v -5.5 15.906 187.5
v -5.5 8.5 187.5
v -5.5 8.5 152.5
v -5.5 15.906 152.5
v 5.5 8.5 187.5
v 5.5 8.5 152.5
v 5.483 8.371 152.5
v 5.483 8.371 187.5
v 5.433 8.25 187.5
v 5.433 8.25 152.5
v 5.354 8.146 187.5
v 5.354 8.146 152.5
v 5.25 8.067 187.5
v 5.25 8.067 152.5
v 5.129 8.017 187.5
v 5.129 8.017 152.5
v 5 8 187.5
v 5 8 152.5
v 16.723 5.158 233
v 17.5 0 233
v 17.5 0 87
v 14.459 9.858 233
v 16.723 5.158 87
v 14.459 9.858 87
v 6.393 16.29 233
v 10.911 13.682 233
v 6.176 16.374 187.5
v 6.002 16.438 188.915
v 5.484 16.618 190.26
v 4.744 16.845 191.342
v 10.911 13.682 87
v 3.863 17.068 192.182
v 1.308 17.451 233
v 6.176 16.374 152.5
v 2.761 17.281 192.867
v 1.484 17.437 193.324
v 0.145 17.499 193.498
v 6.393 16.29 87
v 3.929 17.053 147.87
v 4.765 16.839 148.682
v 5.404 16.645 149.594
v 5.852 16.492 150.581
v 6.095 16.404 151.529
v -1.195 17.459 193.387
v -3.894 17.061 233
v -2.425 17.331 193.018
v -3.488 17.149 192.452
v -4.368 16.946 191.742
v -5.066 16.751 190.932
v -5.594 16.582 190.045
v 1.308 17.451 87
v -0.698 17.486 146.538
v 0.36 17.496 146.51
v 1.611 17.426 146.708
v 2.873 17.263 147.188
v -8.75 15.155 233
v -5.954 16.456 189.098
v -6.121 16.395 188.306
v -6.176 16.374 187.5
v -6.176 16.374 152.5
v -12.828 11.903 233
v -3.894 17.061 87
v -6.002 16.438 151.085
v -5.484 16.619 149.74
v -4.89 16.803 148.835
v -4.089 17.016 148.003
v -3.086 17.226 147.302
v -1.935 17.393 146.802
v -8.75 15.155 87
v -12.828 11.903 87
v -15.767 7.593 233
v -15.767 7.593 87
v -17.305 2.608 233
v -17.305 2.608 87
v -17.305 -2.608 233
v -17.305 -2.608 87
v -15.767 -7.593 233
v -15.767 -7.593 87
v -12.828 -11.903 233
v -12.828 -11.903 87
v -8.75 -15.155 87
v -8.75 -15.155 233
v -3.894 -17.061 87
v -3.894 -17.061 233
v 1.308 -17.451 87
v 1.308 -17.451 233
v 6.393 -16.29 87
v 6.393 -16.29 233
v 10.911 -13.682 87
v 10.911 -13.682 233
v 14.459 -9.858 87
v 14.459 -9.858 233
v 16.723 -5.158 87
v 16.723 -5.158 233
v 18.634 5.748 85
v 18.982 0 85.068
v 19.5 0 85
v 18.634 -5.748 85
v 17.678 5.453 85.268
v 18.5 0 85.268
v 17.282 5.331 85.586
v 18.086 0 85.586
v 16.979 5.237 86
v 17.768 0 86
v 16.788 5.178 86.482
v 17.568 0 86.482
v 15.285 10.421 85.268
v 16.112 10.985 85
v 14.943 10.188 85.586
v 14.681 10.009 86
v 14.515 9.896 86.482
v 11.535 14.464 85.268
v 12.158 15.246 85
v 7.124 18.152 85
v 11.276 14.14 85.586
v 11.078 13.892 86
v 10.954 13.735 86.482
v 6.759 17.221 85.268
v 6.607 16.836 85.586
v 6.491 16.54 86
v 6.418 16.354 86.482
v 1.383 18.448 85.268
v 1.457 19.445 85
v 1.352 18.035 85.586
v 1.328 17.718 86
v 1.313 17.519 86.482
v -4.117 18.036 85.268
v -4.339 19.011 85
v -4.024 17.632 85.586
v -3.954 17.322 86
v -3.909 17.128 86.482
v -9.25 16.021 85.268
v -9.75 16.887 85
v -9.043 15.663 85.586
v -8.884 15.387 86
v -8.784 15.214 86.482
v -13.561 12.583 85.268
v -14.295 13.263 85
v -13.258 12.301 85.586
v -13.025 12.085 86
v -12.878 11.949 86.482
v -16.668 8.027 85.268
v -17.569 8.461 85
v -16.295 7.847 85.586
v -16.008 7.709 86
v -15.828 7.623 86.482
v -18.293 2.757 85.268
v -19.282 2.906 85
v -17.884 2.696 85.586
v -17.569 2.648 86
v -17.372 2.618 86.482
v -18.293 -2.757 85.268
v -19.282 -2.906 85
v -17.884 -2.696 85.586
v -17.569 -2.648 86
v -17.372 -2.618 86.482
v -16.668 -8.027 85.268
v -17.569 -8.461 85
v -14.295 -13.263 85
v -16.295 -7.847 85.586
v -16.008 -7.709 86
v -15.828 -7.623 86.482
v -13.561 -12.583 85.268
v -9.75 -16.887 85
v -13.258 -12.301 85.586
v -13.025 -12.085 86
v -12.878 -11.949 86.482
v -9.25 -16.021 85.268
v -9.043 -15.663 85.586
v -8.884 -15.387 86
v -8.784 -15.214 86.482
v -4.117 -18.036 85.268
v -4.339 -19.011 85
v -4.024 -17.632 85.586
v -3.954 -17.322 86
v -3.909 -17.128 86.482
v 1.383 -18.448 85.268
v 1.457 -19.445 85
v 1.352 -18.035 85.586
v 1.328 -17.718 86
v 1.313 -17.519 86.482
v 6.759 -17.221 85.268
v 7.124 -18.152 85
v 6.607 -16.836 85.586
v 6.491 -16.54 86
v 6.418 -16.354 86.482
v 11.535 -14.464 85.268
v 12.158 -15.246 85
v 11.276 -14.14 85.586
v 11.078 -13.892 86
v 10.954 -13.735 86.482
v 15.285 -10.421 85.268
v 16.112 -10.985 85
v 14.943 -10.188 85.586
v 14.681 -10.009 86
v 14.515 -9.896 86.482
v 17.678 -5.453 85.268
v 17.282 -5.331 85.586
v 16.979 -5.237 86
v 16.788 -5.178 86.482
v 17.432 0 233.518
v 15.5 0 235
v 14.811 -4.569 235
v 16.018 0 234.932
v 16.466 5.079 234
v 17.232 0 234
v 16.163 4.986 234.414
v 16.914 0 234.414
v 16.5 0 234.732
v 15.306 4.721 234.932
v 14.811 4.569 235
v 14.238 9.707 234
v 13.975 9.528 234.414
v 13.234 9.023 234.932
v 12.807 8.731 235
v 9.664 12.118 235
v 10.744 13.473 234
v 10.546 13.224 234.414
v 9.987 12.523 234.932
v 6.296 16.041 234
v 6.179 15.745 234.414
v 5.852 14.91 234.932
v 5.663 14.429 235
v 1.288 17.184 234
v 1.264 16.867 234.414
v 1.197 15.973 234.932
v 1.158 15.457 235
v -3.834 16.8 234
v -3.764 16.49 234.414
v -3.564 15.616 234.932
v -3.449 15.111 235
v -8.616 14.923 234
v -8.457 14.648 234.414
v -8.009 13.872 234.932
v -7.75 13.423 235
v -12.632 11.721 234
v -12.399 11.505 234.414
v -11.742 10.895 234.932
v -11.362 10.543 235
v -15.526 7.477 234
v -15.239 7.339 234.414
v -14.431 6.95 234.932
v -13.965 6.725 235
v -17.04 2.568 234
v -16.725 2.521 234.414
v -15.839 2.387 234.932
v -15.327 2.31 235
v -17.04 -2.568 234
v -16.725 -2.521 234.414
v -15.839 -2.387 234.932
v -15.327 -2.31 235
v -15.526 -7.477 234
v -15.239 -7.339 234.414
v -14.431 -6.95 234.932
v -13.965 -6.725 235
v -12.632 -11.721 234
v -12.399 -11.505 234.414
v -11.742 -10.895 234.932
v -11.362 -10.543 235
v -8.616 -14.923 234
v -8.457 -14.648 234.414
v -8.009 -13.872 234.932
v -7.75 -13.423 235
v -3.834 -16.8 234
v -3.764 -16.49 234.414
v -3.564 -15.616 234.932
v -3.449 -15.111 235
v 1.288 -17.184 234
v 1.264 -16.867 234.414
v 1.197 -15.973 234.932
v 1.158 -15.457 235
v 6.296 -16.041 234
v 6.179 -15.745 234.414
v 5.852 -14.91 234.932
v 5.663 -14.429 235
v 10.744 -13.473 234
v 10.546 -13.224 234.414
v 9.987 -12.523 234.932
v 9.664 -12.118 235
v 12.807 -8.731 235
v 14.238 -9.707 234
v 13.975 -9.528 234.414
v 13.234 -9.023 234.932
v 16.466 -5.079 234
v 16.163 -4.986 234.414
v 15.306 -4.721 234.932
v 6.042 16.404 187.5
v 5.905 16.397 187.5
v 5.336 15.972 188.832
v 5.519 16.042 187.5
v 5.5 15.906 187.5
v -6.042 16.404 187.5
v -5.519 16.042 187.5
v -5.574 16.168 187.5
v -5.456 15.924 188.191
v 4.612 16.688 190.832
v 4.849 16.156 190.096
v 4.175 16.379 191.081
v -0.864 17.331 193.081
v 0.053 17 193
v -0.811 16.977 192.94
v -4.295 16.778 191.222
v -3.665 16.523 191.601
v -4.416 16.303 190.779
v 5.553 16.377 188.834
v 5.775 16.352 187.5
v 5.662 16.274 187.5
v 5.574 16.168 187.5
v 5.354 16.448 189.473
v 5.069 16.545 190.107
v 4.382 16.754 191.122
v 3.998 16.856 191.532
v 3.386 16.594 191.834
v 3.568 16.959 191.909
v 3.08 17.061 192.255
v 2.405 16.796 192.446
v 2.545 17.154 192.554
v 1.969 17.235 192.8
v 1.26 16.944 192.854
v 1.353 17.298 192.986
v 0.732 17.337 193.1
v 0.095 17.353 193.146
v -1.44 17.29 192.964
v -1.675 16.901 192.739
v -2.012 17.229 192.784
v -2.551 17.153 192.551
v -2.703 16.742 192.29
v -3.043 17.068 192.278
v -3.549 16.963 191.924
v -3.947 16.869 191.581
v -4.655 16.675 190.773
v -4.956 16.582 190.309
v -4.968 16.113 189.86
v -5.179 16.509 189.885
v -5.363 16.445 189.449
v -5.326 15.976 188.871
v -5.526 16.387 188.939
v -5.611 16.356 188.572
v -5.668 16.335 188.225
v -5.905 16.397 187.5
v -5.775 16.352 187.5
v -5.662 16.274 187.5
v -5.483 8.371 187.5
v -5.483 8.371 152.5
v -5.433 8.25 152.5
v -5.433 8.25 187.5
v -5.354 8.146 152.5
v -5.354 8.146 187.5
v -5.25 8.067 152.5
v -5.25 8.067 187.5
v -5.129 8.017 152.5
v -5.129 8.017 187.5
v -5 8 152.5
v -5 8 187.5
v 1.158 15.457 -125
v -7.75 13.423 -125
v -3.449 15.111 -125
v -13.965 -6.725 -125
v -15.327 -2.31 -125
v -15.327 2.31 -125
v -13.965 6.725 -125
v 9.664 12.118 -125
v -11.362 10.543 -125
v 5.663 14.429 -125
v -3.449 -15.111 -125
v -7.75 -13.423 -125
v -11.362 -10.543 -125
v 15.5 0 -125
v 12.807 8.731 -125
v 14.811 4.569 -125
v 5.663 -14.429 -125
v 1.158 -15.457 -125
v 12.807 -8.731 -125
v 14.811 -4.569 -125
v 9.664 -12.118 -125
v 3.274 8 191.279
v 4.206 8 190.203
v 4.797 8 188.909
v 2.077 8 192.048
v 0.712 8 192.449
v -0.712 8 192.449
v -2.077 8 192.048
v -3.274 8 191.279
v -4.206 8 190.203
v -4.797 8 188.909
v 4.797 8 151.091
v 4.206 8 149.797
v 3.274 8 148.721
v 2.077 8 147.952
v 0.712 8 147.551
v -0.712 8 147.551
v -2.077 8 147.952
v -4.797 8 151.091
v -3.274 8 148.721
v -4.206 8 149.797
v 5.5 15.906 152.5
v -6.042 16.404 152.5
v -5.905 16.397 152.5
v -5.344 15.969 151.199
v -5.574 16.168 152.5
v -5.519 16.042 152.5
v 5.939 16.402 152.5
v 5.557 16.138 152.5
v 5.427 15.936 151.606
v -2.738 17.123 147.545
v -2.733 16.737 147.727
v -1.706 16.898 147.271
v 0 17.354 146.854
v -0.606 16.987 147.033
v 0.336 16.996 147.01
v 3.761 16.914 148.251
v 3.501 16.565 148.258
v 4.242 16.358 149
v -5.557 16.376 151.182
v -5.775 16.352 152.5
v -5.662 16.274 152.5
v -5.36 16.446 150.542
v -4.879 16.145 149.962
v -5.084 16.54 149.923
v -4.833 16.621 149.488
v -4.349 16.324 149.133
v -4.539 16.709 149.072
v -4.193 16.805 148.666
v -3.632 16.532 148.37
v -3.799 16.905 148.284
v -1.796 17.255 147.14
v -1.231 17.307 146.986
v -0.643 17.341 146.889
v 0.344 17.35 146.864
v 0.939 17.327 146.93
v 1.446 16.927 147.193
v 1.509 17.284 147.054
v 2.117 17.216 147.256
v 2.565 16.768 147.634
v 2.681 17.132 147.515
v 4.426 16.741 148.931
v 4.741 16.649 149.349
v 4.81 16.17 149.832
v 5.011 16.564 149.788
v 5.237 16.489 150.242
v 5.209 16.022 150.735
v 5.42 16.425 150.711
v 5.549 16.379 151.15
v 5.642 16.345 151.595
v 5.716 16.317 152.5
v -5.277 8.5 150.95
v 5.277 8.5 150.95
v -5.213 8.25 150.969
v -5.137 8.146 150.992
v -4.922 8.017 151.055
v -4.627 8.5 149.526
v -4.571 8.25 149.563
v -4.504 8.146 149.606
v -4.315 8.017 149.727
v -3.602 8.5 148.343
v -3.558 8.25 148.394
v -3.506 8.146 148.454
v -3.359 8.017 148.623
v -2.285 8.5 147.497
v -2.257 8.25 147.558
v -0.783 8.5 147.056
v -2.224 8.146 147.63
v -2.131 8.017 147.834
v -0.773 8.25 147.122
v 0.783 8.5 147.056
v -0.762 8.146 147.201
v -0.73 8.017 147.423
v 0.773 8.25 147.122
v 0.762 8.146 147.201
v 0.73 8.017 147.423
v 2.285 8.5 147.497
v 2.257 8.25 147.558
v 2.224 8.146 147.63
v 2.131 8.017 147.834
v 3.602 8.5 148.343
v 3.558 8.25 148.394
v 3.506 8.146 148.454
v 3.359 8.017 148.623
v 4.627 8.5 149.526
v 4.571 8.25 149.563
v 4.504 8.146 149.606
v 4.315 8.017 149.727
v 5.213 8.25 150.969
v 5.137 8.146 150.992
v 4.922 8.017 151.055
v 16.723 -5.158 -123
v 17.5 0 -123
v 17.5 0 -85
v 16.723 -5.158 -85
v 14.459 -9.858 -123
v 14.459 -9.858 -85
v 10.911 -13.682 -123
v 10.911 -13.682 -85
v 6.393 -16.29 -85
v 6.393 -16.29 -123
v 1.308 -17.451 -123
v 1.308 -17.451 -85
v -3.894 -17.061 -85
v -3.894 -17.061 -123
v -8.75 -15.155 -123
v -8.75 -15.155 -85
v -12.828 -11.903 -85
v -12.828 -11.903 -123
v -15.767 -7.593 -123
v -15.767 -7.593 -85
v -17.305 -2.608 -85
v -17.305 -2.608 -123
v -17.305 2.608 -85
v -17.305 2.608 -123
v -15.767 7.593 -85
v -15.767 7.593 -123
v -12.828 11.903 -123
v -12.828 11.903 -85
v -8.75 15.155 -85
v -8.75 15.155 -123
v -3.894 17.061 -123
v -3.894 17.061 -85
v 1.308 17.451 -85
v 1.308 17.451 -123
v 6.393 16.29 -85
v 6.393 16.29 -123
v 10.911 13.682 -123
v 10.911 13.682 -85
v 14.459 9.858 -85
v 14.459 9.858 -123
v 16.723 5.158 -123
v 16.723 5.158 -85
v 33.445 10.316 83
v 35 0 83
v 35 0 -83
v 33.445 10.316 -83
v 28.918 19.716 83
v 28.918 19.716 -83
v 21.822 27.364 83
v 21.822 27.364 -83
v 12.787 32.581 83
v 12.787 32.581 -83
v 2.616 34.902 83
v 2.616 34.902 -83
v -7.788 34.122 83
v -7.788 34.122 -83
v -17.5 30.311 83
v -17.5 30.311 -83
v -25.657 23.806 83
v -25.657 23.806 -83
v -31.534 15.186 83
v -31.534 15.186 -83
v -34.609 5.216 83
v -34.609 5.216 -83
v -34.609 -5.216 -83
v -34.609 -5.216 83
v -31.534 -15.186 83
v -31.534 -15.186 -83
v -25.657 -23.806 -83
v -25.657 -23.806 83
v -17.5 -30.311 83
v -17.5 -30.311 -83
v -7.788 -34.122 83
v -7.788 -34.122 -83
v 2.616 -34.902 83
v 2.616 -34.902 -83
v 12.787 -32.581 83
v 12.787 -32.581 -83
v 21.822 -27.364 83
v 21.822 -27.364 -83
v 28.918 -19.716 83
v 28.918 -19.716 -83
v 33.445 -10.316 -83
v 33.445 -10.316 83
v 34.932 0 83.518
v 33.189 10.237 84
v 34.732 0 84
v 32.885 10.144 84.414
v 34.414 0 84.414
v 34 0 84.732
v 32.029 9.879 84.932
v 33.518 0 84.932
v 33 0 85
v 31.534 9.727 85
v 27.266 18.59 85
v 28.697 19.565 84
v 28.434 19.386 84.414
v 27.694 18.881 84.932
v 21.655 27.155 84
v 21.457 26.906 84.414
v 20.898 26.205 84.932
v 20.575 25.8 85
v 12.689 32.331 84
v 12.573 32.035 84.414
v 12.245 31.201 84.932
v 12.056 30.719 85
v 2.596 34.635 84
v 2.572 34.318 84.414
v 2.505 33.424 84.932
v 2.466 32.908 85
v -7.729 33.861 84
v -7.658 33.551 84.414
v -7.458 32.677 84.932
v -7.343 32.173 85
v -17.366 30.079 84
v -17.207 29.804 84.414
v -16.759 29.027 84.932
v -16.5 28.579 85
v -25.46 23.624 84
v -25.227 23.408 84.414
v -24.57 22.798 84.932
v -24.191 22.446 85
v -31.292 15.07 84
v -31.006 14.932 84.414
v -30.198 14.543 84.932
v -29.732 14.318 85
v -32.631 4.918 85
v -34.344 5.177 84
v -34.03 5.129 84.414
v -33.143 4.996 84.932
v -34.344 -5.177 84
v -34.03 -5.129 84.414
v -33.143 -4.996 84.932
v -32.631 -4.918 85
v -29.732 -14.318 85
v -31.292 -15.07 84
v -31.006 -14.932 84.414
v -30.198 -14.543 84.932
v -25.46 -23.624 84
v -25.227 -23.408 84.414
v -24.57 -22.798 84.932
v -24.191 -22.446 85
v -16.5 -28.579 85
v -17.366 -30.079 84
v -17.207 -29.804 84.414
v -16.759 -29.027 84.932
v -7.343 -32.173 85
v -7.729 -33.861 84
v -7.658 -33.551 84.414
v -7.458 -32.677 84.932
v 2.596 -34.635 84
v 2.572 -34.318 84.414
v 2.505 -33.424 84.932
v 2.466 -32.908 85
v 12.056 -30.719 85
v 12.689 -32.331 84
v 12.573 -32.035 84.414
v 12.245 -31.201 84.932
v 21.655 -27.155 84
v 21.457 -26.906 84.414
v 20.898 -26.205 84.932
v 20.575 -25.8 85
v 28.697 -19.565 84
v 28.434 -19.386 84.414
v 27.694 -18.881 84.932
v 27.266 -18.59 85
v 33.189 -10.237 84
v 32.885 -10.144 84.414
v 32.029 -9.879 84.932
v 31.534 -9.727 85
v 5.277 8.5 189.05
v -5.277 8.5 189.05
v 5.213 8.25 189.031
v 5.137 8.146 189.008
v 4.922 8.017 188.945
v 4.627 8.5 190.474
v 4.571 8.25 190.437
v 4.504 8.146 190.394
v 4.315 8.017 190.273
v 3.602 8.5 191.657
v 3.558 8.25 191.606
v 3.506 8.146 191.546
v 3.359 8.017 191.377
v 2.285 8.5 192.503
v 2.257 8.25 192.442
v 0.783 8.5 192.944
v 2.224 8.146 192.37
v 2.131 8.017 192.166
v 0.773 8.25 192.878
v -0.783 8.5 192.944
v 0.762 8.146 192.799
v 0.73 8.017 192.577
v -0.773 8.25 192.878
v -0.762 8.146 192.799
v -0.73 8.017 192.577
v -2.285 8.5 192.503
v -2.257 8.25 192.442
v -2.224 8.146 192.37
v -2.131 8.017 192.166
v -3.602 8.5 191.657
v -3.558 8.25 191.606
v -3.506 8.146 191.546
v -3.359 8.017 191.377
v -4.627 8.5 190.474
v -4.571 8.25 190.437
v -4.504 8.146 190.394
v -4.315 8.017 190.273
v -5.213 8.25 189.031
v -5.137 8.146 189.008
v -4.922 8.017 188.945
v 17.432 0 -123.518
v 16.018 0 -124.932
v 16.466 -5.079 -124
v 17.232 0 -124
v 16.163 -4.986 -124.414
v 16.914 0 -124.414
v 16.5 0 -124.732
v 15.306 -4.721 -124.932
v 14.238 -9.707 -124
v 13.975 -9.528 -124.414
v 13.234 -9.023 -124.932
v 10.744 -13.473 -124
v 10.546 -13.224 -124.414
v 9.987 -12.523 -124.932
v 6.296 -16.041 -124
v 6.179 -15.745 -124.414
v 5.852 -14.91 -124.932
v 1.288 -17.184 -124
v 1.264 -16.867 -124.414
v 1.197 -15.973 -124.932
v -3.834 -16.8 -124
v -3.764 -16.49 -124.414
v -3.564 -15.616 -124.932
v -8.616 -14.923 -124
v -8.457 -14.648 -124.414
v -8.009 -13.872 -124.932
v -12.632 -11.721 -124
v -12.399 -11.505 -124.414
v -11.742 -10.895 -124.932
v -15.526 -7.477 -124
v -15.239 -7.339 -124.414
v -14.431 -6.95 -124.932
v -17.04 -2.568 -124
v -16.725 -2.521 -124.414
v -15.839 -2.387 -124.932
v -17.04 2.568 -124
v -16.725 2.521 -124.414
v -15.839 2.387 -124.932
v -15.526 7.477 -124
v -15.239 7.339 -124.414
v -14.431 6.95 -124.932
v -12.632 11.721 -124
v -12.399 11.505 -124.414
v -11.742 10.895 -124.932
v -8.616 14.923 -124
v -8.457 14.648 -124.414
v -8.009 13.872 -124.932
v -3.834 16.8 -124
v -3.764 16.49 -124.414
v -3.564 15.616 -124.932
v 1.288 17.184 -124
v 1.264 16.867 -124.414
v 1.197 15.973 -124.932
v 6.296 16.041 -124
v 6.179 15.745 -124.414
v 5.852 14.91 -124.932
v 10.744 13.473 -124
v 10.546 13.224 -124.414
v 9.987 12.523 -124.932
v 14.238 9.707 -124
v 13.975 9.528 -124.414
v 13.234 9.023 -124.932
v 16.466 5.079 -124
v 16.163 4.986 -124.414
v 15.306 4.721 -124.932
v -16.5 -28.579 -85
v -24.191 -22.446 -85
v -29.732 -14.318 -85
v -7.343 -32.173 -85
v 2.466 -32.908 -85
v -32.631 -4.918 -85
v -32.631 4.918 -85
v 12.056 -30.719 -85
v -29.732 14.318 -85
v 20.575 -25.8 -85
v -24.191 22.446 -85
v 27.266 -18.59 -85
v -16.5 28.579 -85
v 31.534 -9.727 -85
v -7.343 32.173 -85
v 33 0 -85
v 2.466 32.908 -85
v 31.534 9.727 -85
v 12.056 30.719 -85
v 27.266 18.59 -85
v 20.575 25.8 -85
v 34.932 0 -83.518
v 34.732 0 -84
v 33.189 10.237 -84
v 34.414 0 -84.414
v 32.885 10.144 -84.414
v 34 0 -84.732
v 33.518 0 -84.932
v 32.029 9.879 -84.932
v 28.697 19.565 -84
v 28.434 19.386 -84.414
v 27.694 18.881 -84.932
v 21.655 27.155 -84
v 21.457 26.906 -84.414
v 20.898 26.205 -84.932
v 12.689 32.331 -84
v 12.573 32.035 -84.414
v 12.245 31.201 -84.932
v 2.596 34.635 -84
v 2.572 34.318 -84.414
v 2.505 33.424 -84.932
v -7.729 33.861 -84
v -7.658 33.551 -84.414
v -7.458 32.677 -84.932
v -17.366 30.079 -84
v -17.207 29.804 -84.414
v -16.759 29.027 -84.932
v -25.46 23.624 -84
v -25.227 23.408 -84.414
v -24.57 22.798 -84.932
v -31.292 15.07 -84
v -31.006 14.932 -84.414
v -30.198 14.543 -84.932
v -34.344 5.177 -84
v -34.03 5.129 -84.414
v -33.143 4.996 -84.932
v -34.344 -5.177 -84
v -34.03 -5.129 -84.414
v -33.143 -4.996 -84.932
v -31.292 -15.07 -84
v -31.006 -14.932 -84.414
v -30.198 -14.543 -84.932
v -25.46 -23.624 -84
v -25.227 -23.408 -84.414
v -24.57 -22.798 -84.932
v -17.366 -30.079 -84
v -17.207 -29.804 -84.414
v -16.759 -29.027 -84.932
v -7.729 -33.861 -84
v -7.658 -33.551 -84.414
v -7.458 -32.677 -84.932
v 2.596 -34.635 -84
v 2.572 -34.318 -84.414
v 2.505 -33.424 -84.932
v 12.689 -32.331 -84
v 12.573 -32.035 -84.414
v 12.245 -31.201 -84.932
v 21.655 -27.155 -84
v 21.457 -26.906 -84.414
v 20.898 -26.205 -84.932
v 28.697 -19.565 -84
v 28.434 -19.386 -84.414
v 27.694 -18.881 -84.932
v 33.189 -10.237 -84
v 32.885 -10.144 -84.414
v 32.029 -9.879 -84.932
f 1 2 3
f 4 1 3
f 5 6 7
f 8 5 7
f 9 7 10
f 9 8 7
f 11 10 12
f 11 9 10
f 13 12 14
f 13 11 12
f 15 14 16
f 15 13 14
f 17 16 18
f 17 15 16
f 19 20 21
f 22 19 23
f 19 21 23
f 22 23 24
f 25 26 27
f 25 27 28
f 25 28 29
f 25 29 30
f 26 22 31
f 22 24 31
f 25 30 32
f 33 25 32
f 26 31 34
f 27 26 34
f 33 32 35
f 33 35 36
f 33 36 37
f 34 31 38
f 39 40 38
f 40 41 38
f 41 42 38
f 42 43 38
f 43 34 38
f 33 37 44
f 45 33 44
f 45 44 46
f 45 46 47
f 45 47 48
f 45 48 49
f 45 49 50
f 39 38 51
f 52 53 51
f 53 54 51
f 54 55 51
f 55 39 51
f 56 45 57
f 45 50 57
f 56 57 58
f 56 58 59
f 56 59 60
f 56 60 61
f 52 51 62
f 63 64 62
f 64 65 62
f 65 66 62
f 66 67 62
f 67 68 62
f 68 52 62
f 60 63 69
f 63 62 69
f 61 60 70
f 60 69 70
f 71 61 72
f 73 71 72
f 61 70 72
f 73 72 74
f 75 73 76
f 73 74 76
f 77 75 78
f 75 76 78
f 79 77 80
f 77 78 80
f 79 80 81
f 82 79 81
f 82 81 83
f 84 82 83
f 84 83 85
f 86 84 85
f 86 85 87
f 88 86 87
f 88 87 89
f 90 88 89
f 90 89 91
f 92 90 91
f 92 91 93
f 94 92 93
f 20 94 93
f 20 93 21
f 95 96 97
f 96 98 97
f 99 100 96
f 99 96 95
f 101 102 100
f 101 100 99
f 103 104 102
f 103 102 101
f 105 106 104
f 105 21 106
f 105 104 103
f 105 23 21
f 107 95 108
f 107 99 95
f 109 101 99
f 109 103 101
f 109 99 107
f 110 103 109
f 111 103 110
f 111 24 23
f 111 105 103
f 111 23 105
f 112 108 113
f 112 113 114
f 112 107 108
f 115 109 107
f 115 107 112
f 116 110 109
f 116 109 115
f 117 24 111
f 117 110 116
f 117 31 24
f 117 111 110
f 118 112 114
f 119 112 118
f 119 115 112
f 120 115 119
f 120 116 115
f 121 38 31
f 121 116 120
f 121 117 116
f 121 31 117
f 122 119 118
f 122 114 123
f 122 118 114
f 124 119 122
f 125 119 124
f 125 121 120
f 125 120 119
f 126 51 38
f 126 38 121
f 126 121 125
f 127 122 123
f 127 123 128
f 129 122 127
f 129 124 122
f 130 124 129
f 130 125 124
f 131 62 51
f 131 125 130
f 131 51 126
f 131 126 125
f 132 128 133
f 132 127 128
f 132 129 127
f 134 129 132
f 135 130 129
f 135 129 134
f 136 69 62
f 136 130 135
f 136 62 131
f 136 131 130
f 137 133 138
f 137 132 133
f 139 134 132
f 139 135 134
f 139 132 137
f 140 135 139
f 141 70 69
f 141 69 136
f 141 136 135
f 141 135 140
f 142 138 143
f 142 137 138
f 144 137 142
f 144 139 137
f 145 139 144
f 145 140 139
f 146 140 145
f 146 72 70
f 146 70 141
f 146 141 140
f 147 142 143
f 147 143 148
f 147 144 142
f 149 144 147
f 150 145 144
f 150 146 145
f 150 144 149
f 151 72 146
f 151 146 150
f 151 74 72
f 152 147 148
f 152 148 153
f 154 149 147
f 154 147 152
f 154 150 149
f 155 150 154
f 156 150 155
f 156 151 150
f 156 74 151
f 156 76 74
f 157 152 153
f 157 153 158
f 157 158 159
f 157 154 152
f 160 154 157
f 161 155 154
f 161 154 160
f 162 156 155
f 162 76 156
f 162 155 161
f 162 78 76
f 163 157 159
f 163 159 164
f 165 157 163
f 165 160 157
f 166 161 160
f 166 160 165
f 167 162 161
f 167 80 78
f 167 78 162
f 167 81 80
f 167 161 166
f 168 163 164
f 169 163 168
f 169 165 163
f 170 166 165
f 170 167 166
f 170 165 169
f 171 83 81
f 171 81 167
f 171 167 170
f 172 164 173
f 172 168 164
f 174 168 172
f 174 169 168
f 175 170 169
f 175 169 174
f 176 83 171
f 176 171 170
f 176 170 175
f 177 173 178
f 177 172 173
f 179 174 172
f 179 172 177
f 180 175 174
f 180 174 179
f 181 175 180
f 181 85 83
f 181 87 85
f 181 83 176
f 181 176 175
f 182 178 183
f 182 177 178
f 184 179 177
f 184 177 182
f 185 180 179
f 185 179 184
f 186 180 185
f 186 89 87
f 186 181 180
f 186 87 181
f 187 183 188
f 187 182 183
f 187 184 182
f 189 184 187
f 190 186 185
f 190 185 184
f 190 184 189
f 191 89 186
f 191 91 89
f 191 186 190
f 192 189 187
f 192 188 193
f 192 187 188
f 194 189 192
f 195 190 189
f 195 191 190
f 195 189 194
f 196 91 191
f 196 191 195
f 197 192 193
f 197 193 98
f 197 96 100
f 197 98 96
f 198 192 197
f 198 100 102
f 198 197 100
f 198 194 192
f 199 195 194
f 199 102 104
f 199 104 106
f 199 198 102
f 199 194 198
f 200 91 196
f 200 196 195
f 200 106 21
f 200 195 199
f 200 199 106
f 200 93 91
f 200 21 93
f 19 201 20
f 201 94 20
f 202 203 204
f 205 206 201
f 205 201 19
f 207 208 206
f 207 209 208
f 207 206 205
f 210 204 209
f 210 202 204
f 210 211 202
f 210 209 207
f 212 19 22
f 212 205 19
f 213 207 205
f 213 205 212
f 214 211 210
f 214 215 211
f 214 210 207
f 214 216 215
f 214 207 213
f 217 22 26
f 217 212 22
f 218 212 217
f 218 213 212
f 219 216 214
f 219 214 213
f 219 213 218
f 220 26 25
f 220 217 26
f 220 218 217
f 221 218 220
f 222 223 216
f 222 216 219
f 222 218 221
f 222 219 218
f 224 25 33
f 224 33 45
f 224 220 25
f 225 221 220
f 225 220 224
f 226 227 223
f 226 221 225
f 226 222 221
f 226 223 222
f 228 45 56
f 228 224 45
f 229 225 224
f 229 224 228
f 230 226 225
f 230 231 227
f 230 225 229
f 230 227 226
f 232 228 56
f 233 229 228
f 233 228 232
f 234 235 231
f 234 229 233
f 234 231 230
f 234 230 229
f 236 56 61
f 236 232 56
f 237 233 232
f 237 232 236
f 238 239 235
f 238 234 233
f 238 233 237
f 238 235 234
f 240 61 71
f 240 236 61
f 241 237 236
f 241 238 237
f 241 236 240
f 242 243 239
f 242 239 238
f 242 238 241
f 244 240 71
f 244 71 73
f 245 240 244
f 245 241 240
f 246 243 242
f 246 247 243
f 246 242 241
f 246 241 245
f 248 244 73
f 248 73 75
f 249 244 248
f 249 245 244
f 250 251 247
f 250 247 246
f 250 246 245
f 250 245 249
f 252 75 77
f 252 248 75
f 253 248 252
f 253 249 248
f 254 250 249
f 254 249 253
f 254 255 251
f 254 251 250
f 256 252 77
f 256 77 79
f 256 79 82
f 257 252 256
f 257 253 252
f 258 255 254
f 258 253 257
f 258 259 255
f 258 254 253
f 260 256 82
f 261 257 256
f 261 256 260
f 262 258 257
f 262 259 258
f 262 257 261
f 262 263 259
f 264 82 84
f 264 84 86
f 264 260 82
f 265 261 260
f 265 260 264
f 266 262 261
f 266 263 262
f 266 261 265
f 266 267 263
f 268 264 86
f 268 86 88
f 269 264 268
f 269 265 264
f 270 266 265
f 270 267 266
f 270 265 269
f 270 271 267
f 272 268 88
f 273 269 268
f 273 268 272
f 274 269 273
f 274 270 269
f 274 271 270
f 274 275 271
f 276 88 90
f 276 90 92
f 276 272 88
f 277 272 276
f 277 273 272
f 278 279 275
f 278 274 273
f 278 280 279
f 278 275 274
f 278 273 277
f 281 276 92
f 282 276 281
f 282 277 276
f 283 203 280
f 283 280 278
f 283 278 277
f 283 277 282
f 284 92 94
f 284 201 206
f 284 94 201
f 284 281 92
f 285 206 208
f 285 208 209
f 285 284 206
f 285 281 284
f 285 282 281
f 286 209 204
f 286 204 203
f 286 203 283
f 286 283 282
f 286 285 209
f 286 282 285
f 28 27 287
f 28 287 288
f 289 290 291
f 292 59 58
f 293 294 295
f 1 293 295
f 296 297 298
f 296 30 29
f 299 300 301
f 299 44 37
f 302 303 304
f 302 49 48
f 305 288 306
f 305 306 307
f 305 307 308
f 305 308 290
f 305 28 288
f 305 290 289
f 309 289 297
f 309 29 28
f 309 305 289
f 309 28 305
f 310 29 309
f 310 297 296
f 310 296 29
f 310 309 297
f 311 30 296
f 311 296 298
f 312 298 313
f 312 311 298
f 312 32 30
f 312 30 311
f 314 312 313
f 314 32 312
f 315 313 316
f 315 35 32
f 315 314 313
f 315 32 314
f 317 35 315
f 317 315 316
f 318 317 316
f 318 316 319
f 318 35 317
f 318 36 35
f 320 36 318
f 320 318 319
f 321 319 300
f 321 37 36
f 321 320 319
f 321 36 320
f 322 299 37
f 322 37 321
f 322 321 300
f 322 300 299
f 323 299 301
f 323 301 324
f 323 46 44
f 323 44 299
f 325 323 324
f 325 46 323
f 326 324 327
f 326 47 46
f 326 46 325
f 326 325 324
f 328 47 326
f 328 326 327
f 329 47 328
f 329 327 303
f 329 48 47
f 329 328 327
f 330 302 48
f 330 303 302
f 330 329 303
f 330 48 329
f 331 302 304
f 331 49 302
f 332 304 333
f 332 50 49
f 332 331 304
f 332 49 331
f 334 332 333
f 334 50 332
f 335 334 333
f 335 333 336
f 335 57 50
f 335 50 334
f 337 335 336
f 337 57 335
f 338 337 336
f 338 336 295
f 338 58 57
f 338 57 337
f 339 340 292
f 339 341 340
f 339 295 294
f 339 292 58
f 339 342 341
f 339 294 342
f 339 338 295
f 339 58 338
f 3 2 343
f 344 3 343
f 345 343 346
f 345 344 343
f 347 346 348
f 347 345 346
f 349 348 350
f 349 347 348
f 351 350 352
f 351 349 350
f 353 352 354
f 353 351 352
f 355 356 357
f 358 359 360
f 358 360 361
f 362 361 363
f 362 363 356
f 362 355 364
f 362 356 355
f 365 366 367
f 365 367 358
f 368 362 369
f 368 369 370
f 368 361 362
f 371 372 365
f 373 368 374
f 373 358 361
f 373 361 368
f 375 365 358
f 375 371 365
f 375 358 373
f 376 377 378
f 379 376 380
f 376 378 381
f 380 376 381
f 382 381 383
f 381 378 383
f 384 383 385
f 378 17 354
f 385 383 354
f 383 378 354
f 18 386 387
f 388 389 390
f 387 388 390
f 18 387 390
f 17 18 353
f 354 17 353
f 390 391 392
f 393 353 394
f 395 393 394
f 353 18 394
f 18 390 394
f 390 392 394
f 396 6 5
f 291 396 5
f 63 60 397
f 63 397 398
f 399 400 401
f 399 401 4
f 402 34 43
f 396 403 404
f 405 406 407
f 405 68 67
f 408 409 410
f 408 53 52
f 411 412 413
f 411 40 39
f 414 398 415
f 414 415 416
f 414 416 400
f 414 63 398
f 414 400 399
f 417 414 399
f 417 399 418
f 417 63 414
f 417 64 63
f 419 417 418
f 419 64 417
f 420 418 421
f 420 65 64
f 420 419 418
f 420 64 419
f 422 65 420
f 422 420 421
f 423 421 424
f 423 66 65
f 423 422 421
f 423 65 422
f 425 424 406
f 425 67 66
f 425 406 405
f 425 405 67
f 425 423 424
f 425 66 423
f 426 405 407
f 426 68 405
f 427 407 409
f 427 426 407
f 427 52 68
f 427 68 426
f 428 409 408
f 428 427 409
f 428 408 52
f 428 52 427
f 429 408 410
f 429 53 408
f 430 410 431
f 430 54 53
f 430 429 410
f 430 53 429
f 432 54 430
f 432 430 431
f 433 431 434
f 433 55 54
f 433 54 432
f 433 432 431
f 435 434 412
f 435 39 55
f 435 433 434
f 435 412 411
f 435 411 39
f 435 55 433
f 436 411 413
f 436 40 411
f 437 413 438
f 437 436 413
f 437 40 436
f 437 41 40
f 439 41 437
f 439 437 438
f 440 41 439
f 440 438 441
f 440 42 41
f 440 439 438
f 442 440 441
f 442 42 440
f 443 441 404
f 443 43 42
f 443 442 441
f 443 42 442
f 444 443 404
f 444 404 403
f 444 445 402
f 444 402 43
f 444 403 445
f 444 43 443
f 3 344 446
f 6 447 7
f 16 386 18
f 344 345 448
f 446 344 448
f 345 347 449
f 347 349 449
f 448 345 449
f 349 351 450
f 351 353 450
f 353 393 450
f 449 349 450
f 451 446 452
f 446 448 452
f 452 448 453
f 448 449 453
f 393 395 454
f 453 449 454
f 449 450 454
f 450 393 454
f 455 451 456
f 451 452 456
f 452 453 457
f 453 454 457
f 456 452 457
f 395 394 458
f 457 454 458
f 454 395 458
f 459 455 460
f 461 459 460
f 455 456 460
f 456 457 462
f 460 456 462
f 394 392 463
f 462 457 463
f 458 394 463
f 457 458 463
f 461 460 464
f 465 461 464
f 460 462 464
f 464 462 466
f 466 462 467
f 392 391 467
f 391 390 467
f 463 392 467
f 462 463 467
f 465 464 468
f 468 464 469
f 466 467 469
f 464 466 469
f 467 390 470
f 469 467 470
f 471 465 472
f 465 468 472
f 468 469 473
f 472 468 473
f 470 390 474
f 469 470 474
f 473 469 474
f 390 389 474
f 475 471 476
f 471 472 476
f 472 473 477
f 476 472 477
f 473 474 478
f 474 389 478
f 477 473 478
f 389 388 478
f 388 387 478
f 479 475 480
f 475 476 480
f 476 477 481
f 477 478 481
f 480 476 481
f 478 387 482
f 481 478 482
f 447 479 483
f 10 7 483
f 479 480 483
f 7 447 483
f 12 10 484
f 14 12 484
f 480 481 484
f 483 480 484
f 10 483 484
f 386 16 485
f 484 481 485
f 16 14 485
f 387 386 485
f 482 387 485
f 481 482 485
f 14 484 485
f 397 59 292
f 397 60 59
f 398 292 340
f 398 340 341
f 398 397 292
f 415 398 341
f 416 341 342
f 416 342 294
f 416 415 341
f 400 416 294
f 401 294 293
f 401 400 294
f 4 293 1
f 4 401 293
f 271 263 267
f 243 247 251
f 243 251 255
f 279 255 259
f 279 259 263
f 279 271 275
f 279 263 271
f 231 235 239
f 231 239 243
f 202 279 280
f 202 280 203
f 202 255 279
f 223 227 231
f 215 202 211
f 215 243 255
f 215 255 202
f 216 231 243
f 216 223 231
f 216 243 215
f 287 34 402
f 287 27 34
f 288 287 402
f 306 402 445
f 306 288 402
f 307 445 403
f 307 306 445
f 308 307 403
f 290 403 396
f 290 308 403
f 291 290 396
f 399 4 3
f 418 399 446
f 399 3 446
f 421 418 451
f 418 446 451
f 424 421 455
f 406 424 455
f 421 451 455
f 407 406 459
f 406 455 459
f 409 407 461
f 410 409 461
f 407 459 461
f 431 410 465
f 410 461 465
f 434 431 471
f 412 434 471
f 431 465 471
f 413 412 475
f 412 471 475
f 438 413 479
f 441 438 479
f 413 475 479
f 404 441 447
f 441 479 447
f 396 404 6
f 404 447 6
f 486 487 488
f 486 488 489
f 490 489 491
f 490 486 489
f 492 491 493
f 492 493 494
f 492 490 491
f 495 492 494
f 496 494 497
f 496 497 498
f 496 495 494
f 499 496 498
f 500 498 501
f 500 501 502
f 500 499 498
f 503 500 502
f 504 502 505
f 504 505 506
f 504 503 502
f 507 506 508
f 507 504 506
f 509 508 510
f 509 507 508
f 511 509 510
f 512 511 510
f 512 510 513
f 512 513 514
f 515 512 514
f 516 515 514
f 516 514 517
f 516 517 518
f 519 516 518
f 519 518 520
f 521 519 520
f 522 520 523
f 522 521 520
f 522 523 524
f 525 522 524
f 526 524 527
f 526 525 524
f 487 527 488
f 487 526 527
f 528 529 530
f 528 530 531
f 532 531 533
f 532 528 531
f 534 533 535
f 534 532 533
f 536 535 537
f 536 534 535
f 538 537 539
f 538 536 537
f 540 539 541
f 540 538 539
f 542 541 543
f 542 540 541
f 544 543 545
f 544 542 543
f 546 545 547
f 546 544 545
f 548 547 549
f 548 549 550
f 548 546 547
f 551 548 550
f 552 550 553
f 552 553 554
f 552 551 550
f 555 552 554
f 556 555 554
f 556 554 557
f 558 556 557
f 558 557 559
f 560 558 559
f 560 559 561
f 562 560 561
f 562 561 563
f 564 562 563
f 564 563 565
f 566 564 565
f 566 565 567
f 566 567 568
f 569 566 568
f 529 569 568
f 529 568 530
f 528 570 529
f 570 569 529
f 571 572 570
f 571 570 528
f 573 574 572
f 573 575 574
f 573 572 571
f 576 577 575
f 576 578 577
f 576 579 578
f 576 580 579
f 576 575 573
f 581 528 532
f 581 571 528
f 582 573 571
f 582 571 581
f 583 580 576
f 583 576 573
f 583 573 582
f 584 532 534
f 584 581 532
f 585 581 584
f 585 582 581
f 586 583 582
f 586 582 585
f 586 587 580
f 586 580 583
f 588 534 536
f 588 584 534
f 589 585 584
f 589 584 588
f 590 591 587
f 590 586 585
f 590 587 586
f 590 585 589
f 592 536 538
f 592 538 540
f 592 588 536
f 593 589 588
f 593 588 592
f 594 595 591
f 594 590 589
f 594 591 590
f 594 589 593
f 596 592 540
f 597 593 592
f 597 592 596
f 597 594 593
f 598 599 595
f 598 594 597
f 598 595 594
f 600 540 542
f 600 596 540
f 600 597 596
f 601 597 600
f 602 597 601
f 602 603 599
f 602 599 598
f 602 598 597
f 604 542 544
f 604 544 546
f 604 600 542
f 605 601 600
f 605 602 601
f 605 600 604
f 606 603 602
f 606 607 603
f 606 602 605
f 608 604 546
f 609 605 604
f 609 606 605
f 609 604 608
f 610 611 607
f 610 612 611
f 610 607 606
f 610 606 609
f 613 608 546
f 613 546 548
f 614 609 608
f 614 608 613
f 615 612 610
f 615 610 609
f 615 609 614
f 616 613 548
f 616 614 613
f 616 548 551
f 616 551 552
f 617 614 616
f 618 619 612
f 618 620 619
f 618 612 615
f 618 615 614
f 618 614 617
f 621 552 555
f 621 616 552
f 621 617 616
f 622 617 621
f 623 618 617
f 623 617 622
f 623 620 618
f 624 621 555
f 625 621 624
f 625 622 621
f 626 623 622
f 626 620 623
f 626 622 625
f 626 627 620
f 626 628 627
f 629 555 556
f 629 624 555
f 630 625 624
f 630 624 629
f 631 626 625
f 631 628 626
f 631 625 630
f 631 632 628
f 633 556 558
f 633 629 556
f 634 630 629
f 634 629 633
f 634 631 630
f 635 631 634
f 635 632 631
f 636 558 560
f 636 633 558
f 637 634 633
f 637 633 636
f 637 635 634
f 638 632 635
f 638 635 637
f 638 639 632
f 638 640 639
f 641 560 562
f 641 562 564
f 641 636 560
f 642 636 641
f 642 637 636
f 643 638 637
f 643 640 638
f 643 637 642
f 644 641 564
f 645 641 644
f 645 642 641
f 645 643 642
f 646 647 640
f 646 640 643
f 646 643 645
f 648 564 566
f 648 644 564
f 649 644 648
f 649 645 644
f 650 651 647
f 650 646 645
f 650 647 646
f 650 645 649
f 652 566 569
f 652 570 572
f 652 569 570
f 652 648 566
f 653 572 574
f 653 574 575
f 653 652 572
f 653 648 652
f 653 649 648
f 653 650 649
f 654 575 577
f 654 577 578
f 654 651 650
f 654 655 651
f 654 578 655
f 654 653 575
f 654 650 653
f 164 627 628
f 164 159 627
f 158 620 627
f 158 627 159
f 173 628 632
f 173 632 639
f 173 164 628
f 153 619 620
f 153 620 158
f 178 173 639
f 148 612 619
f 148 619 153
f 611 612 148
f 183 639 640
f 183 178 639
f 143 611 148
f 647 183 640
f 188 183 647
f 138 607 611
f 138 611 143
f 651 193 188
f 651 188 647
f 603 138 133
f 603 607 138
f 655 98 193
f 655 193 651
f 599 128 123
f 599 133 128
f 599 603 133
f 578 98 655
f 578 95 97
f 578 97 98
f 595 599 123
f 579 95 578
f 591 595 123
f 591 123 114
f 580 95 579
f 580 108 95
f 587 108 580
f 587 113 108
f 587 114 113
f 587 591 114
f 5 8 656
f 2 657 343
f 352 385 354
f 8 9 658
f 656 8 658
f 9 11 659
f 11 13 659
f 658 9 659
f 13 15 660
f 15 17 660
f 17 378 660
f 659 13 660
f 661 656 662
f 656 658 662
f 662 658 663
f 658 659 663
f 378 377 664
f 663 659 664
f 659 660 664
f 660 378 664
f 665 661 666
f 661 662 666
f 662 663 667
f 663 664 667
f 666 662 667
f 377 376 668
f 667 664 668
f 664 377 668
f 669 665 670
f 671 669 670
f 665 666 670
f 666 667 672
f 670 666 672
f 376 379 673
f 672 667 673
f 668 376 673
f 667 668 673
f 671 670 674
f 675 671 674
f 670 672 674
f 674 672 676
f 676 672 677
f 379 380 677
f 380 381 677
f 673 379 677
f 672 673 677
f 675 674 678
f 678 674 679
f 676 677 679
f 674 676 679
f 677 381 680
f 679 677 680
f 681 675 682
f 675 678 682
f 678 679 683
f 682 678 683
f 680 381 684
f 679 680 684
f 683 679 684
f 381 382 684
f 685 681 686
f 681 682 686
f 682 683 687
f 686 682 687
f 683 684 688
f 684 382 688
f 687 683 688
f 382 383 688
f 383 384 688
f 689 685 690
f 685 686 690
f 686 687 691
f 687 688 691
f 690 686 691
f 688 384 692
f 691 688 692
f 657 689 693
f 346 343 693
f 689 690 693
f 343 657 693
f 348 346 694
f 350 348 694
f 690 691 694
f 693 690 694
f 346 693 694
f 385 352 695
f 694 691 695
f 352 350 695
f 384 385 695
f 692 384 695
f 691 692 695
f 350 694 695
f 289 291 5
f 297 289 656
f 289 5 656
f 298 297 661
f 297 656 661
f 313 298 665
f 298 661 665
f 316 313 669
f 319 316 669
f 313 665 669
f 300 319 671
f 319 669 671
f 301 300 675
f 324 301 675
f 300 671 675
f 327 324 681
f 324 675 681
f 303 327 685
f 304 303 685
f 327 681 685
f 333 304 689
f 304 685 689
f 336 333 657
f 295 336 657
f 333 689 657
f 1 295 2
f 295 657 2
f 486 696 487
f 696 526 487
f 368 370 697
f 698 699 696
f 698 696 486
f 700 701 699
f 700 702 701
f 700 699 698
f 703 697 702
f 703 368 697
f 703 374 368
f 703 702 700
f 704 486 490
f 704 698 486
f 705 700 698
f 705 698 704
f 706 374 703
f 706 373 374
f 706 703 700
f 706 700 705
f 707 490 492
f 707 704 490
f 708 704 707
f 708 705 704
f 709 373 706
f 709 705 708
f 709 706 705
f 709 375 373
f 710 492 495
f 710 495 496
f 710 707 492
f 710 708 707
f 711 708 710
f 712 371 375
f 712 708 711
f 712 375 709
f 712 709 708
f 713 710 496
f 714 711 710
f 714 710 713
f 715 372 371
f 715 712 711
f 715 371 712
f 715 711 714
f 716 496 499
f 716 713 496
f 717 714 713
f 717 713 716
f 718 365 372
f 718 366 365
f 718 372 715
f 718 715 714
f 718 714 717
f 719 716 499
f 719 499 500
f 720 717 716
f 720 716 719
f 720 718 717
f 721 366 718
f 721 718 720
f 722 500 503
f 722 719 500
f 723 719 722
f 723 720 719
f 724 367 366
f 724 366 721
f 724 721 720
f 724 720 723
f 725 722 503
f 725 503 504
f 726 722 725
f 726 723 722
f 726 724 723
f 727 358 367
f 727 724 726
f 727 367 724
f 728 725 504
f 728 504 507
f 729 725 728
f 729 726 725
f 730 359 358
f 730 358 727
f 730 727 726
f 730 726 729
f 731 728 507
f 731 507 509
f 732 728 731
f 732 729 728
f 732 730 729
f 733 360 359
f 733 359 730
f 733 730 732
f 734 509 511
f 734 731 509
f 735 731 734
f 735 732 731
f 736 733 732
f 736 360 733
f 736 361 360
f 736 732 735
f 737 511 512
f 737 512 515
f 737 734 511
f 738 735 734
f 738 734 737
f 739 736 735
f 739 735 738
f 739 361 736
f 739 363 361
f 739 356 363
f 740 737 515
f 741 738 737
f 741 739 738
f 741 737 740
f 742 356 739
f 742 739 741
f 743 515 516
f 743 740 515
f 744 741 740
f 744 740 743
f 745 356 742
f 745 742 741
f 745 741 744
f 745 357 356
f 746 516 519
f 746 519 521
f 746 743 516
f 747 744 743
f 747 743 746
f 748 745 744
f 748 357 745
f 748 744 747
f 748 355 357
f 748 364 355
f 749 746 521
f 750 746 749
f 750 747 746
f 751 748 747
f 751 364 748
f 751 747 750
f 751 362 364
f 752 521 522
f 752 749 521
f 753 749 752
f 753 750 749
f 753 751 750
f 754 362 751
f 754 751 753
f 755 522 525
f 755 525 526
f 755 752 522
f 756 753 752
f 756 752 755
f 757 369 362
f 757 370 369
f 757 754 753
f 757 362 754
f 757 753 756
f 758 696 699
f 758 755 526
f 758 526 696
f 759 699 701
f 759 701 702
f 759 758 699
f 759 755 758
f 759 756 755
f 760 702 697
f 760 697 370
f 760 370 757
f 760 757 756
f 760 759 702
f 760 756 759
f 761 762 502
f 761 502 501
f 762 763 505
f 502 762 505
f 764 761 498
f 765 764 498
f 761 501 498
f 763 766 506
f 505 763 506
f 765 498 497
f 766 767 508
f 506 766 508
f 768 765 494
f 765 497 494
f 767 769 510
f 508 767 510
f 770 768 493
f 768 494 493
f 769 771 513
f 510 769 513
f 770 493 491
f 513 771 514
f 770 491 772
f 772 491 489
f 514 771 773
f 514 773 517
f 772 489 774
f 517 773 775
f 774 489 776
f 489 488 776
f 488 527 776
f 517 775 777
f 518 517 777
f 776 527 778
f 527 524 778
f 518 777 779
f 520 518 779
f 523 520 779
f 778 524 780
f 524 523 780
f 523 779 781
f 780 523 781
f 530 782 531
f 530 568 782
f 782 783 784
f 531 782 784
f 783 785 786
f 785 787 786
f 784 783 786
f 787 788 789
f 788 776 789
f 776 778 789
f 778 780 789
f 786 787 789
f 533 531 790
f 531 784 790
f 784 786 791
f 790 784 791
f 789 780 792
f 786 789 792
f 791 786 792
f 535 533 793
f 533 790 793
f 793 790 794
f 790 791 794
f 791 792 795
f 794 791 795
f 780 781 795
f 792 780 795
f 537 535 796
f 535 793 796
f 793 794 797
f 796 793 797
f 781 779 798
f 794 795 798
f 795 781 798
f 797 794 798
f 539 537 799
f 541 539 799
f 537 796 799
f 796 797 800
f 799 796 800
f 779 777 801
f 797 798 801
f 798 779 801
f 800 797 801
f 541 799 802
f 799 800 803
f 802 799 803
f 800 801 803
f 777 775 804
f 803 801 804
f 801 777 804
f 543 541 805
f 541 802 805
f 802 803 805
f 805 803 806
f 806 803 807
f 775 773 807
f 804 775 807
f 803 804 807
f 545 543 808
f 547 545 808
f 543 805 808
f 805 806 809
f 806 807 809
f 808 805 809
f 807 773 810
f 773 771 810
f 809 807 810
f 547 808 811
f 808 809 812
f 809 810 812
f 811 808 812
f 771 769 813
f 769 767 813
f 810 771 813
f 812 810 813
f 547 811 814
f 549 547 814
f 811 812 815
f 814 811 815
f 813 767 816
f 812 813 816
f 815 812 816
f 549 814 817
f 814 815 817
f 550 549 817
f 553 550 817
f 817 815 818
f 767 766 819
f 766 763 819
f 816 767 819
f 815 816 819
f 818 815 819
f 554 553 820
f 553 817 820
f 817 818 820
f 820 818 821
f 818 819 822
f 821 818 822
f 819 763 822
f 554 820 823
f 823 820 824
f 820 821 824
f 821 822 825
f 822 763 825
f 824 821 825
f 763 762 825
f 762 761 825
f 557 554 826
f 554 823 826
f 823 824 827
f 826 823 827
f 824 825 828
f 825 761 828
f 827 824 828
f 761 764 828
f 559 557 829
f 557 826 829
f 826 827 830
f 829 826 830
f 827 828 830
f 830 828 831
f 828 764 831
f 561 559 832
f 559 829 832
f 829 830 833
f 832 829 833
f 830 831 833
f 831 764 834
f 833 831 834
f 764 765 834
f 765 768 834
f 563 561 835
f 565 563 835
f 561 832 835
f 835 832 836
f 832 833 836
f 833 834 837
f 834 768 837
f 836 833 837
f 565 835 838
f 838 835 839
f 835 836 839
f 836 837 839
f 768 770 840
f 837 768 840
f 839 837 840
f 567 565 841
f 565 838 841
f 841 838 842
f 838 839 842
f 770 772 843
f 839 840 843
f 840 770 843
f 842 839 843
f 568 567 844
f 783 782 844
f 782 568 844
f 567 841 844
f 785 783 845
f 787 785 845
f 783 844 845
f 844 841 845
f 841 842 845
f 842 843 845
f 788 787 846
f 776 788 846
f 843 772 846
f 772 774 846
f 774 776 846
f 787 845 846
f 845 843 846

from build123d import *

# Parameters (mm, degrees)
SKETCH1_R               = 35
BOSS_EXTRUDE1_DEPTH     = 85
SKETCH2_R               = 17.5
BOSS_EXTRUDE2_DEPTH     = 150
BOSS_EXTRUDE3_START     = 40
SKETCH3_R               = 17.5
BOSS_EXTRUDE3_DEPTH     = 40
FILLET1_R               = 2
CUT_EXTRUDE1_REACH      = 243.452
CUT_EXTRUDE1_END_RADIUS = 17.5
FILLET2_R               = 0.5


with BuildPart() as part:
    # Sketch1 → Boss-Extrude1 (new, symmetric)
    with BuildSketch(Plane.XY):
        Circle(SKETCH1_R)
    extrude(amount=BOSS_EXTRUDE1_DEPTH, both=True)

    # Sketch2 → Boss-Extrude2 (add)
    with BuildSketch(Plane.XY.offset(85)):
        Circle(SKETCH2_R)
    extrude(amount=BOSS_EXTRUDE2_DEPTH)

    # Sketch3 → Boss-Extrude3 (add)
    with BuildSketch(Plane(origin=(0, 0, -85), x_dir=(-1, 0, 0), z_dir=(0, 0, -1)).offset(BOSS_EXTRUDE3_START)):
        with Locations(Location((0, 0, 0), (0, 0, 180))):
            Circle(SKETCH3_R)
    extrude(amount=-BOSS_EXTRUDE3_DEPTH)

    # Fillet1
    fillet1_edges = [part.edges().sort_by_distance(p)[0] for p in [
        (-17.5, 0, -125),
        (-35, 0, -85),
        (-35, 0, 85),
        (-17.5, 0, 85),
        (-17.5, 0, 235),
    ]]
    fillet(fillet1_edges, radius=FILLET1_R)

    # Cut-Extrude1: up to this cylinder (the profile starts inside it)
    cut_extrude1_end = Plane(origin=(0, 0, 170), z_dir=(0, 0, -1)) * Cylinder(CUT_EXTRUDE1_END_RADIUS, 522.904, mode=Mode.PRIVATE)
    # Sketch4 → Cut-Extrude1 (cut, up to the surface)
    with BuildSketch(Plane(origin=(0, 8, 0), x_dir=(1, 0, 0), z_dir=(0, 1, 0)), mode=Mode.PRIVATE) as cut_extrude1_sk1:
        with BuildLine():
            Line((-5.5, -187.5), (-5.5, -152.5))
            ThreePointArc((-5.5, -152.5), (0, -147), (5.5, -152.5))
            Line((5.5, -152.5), (5.5, -187.5))
            ThreePointArc((5.5, -187.5), (0, -193), (-5.5, -187.5))
        make_face()
    cut_extrude1_tool1 = extrude(cut_extrude1_sk1.sketch, amount=CUT_EXTRUDE1_REACH, mode=Mode.PRIVATE) & cut_extrude1_end
    add(cut_extrude1_tool1.solids().sort_by_distance((0, 8, 170))[0], mode=Mode.SUBTRACT)

    # Fillet2
    fillet2_edges = [part.edges().sort_by_distance(p)[0] for p in [
        (0, 17.500000003, 193.000000004),
        (0, 8, 193),
        (5.5, 16.613247726, 170),
        (5.5, 8, 170),
        (-2e-09, 17.499999972, 146.999999993),
        (0, 8, 147),
        (-5.5, 16.613247726, 170),
        (-5.5, 8, 170),
    ]]
    fillet(fillet2_edges, radius=FILLET2_R)


solid = part.part
